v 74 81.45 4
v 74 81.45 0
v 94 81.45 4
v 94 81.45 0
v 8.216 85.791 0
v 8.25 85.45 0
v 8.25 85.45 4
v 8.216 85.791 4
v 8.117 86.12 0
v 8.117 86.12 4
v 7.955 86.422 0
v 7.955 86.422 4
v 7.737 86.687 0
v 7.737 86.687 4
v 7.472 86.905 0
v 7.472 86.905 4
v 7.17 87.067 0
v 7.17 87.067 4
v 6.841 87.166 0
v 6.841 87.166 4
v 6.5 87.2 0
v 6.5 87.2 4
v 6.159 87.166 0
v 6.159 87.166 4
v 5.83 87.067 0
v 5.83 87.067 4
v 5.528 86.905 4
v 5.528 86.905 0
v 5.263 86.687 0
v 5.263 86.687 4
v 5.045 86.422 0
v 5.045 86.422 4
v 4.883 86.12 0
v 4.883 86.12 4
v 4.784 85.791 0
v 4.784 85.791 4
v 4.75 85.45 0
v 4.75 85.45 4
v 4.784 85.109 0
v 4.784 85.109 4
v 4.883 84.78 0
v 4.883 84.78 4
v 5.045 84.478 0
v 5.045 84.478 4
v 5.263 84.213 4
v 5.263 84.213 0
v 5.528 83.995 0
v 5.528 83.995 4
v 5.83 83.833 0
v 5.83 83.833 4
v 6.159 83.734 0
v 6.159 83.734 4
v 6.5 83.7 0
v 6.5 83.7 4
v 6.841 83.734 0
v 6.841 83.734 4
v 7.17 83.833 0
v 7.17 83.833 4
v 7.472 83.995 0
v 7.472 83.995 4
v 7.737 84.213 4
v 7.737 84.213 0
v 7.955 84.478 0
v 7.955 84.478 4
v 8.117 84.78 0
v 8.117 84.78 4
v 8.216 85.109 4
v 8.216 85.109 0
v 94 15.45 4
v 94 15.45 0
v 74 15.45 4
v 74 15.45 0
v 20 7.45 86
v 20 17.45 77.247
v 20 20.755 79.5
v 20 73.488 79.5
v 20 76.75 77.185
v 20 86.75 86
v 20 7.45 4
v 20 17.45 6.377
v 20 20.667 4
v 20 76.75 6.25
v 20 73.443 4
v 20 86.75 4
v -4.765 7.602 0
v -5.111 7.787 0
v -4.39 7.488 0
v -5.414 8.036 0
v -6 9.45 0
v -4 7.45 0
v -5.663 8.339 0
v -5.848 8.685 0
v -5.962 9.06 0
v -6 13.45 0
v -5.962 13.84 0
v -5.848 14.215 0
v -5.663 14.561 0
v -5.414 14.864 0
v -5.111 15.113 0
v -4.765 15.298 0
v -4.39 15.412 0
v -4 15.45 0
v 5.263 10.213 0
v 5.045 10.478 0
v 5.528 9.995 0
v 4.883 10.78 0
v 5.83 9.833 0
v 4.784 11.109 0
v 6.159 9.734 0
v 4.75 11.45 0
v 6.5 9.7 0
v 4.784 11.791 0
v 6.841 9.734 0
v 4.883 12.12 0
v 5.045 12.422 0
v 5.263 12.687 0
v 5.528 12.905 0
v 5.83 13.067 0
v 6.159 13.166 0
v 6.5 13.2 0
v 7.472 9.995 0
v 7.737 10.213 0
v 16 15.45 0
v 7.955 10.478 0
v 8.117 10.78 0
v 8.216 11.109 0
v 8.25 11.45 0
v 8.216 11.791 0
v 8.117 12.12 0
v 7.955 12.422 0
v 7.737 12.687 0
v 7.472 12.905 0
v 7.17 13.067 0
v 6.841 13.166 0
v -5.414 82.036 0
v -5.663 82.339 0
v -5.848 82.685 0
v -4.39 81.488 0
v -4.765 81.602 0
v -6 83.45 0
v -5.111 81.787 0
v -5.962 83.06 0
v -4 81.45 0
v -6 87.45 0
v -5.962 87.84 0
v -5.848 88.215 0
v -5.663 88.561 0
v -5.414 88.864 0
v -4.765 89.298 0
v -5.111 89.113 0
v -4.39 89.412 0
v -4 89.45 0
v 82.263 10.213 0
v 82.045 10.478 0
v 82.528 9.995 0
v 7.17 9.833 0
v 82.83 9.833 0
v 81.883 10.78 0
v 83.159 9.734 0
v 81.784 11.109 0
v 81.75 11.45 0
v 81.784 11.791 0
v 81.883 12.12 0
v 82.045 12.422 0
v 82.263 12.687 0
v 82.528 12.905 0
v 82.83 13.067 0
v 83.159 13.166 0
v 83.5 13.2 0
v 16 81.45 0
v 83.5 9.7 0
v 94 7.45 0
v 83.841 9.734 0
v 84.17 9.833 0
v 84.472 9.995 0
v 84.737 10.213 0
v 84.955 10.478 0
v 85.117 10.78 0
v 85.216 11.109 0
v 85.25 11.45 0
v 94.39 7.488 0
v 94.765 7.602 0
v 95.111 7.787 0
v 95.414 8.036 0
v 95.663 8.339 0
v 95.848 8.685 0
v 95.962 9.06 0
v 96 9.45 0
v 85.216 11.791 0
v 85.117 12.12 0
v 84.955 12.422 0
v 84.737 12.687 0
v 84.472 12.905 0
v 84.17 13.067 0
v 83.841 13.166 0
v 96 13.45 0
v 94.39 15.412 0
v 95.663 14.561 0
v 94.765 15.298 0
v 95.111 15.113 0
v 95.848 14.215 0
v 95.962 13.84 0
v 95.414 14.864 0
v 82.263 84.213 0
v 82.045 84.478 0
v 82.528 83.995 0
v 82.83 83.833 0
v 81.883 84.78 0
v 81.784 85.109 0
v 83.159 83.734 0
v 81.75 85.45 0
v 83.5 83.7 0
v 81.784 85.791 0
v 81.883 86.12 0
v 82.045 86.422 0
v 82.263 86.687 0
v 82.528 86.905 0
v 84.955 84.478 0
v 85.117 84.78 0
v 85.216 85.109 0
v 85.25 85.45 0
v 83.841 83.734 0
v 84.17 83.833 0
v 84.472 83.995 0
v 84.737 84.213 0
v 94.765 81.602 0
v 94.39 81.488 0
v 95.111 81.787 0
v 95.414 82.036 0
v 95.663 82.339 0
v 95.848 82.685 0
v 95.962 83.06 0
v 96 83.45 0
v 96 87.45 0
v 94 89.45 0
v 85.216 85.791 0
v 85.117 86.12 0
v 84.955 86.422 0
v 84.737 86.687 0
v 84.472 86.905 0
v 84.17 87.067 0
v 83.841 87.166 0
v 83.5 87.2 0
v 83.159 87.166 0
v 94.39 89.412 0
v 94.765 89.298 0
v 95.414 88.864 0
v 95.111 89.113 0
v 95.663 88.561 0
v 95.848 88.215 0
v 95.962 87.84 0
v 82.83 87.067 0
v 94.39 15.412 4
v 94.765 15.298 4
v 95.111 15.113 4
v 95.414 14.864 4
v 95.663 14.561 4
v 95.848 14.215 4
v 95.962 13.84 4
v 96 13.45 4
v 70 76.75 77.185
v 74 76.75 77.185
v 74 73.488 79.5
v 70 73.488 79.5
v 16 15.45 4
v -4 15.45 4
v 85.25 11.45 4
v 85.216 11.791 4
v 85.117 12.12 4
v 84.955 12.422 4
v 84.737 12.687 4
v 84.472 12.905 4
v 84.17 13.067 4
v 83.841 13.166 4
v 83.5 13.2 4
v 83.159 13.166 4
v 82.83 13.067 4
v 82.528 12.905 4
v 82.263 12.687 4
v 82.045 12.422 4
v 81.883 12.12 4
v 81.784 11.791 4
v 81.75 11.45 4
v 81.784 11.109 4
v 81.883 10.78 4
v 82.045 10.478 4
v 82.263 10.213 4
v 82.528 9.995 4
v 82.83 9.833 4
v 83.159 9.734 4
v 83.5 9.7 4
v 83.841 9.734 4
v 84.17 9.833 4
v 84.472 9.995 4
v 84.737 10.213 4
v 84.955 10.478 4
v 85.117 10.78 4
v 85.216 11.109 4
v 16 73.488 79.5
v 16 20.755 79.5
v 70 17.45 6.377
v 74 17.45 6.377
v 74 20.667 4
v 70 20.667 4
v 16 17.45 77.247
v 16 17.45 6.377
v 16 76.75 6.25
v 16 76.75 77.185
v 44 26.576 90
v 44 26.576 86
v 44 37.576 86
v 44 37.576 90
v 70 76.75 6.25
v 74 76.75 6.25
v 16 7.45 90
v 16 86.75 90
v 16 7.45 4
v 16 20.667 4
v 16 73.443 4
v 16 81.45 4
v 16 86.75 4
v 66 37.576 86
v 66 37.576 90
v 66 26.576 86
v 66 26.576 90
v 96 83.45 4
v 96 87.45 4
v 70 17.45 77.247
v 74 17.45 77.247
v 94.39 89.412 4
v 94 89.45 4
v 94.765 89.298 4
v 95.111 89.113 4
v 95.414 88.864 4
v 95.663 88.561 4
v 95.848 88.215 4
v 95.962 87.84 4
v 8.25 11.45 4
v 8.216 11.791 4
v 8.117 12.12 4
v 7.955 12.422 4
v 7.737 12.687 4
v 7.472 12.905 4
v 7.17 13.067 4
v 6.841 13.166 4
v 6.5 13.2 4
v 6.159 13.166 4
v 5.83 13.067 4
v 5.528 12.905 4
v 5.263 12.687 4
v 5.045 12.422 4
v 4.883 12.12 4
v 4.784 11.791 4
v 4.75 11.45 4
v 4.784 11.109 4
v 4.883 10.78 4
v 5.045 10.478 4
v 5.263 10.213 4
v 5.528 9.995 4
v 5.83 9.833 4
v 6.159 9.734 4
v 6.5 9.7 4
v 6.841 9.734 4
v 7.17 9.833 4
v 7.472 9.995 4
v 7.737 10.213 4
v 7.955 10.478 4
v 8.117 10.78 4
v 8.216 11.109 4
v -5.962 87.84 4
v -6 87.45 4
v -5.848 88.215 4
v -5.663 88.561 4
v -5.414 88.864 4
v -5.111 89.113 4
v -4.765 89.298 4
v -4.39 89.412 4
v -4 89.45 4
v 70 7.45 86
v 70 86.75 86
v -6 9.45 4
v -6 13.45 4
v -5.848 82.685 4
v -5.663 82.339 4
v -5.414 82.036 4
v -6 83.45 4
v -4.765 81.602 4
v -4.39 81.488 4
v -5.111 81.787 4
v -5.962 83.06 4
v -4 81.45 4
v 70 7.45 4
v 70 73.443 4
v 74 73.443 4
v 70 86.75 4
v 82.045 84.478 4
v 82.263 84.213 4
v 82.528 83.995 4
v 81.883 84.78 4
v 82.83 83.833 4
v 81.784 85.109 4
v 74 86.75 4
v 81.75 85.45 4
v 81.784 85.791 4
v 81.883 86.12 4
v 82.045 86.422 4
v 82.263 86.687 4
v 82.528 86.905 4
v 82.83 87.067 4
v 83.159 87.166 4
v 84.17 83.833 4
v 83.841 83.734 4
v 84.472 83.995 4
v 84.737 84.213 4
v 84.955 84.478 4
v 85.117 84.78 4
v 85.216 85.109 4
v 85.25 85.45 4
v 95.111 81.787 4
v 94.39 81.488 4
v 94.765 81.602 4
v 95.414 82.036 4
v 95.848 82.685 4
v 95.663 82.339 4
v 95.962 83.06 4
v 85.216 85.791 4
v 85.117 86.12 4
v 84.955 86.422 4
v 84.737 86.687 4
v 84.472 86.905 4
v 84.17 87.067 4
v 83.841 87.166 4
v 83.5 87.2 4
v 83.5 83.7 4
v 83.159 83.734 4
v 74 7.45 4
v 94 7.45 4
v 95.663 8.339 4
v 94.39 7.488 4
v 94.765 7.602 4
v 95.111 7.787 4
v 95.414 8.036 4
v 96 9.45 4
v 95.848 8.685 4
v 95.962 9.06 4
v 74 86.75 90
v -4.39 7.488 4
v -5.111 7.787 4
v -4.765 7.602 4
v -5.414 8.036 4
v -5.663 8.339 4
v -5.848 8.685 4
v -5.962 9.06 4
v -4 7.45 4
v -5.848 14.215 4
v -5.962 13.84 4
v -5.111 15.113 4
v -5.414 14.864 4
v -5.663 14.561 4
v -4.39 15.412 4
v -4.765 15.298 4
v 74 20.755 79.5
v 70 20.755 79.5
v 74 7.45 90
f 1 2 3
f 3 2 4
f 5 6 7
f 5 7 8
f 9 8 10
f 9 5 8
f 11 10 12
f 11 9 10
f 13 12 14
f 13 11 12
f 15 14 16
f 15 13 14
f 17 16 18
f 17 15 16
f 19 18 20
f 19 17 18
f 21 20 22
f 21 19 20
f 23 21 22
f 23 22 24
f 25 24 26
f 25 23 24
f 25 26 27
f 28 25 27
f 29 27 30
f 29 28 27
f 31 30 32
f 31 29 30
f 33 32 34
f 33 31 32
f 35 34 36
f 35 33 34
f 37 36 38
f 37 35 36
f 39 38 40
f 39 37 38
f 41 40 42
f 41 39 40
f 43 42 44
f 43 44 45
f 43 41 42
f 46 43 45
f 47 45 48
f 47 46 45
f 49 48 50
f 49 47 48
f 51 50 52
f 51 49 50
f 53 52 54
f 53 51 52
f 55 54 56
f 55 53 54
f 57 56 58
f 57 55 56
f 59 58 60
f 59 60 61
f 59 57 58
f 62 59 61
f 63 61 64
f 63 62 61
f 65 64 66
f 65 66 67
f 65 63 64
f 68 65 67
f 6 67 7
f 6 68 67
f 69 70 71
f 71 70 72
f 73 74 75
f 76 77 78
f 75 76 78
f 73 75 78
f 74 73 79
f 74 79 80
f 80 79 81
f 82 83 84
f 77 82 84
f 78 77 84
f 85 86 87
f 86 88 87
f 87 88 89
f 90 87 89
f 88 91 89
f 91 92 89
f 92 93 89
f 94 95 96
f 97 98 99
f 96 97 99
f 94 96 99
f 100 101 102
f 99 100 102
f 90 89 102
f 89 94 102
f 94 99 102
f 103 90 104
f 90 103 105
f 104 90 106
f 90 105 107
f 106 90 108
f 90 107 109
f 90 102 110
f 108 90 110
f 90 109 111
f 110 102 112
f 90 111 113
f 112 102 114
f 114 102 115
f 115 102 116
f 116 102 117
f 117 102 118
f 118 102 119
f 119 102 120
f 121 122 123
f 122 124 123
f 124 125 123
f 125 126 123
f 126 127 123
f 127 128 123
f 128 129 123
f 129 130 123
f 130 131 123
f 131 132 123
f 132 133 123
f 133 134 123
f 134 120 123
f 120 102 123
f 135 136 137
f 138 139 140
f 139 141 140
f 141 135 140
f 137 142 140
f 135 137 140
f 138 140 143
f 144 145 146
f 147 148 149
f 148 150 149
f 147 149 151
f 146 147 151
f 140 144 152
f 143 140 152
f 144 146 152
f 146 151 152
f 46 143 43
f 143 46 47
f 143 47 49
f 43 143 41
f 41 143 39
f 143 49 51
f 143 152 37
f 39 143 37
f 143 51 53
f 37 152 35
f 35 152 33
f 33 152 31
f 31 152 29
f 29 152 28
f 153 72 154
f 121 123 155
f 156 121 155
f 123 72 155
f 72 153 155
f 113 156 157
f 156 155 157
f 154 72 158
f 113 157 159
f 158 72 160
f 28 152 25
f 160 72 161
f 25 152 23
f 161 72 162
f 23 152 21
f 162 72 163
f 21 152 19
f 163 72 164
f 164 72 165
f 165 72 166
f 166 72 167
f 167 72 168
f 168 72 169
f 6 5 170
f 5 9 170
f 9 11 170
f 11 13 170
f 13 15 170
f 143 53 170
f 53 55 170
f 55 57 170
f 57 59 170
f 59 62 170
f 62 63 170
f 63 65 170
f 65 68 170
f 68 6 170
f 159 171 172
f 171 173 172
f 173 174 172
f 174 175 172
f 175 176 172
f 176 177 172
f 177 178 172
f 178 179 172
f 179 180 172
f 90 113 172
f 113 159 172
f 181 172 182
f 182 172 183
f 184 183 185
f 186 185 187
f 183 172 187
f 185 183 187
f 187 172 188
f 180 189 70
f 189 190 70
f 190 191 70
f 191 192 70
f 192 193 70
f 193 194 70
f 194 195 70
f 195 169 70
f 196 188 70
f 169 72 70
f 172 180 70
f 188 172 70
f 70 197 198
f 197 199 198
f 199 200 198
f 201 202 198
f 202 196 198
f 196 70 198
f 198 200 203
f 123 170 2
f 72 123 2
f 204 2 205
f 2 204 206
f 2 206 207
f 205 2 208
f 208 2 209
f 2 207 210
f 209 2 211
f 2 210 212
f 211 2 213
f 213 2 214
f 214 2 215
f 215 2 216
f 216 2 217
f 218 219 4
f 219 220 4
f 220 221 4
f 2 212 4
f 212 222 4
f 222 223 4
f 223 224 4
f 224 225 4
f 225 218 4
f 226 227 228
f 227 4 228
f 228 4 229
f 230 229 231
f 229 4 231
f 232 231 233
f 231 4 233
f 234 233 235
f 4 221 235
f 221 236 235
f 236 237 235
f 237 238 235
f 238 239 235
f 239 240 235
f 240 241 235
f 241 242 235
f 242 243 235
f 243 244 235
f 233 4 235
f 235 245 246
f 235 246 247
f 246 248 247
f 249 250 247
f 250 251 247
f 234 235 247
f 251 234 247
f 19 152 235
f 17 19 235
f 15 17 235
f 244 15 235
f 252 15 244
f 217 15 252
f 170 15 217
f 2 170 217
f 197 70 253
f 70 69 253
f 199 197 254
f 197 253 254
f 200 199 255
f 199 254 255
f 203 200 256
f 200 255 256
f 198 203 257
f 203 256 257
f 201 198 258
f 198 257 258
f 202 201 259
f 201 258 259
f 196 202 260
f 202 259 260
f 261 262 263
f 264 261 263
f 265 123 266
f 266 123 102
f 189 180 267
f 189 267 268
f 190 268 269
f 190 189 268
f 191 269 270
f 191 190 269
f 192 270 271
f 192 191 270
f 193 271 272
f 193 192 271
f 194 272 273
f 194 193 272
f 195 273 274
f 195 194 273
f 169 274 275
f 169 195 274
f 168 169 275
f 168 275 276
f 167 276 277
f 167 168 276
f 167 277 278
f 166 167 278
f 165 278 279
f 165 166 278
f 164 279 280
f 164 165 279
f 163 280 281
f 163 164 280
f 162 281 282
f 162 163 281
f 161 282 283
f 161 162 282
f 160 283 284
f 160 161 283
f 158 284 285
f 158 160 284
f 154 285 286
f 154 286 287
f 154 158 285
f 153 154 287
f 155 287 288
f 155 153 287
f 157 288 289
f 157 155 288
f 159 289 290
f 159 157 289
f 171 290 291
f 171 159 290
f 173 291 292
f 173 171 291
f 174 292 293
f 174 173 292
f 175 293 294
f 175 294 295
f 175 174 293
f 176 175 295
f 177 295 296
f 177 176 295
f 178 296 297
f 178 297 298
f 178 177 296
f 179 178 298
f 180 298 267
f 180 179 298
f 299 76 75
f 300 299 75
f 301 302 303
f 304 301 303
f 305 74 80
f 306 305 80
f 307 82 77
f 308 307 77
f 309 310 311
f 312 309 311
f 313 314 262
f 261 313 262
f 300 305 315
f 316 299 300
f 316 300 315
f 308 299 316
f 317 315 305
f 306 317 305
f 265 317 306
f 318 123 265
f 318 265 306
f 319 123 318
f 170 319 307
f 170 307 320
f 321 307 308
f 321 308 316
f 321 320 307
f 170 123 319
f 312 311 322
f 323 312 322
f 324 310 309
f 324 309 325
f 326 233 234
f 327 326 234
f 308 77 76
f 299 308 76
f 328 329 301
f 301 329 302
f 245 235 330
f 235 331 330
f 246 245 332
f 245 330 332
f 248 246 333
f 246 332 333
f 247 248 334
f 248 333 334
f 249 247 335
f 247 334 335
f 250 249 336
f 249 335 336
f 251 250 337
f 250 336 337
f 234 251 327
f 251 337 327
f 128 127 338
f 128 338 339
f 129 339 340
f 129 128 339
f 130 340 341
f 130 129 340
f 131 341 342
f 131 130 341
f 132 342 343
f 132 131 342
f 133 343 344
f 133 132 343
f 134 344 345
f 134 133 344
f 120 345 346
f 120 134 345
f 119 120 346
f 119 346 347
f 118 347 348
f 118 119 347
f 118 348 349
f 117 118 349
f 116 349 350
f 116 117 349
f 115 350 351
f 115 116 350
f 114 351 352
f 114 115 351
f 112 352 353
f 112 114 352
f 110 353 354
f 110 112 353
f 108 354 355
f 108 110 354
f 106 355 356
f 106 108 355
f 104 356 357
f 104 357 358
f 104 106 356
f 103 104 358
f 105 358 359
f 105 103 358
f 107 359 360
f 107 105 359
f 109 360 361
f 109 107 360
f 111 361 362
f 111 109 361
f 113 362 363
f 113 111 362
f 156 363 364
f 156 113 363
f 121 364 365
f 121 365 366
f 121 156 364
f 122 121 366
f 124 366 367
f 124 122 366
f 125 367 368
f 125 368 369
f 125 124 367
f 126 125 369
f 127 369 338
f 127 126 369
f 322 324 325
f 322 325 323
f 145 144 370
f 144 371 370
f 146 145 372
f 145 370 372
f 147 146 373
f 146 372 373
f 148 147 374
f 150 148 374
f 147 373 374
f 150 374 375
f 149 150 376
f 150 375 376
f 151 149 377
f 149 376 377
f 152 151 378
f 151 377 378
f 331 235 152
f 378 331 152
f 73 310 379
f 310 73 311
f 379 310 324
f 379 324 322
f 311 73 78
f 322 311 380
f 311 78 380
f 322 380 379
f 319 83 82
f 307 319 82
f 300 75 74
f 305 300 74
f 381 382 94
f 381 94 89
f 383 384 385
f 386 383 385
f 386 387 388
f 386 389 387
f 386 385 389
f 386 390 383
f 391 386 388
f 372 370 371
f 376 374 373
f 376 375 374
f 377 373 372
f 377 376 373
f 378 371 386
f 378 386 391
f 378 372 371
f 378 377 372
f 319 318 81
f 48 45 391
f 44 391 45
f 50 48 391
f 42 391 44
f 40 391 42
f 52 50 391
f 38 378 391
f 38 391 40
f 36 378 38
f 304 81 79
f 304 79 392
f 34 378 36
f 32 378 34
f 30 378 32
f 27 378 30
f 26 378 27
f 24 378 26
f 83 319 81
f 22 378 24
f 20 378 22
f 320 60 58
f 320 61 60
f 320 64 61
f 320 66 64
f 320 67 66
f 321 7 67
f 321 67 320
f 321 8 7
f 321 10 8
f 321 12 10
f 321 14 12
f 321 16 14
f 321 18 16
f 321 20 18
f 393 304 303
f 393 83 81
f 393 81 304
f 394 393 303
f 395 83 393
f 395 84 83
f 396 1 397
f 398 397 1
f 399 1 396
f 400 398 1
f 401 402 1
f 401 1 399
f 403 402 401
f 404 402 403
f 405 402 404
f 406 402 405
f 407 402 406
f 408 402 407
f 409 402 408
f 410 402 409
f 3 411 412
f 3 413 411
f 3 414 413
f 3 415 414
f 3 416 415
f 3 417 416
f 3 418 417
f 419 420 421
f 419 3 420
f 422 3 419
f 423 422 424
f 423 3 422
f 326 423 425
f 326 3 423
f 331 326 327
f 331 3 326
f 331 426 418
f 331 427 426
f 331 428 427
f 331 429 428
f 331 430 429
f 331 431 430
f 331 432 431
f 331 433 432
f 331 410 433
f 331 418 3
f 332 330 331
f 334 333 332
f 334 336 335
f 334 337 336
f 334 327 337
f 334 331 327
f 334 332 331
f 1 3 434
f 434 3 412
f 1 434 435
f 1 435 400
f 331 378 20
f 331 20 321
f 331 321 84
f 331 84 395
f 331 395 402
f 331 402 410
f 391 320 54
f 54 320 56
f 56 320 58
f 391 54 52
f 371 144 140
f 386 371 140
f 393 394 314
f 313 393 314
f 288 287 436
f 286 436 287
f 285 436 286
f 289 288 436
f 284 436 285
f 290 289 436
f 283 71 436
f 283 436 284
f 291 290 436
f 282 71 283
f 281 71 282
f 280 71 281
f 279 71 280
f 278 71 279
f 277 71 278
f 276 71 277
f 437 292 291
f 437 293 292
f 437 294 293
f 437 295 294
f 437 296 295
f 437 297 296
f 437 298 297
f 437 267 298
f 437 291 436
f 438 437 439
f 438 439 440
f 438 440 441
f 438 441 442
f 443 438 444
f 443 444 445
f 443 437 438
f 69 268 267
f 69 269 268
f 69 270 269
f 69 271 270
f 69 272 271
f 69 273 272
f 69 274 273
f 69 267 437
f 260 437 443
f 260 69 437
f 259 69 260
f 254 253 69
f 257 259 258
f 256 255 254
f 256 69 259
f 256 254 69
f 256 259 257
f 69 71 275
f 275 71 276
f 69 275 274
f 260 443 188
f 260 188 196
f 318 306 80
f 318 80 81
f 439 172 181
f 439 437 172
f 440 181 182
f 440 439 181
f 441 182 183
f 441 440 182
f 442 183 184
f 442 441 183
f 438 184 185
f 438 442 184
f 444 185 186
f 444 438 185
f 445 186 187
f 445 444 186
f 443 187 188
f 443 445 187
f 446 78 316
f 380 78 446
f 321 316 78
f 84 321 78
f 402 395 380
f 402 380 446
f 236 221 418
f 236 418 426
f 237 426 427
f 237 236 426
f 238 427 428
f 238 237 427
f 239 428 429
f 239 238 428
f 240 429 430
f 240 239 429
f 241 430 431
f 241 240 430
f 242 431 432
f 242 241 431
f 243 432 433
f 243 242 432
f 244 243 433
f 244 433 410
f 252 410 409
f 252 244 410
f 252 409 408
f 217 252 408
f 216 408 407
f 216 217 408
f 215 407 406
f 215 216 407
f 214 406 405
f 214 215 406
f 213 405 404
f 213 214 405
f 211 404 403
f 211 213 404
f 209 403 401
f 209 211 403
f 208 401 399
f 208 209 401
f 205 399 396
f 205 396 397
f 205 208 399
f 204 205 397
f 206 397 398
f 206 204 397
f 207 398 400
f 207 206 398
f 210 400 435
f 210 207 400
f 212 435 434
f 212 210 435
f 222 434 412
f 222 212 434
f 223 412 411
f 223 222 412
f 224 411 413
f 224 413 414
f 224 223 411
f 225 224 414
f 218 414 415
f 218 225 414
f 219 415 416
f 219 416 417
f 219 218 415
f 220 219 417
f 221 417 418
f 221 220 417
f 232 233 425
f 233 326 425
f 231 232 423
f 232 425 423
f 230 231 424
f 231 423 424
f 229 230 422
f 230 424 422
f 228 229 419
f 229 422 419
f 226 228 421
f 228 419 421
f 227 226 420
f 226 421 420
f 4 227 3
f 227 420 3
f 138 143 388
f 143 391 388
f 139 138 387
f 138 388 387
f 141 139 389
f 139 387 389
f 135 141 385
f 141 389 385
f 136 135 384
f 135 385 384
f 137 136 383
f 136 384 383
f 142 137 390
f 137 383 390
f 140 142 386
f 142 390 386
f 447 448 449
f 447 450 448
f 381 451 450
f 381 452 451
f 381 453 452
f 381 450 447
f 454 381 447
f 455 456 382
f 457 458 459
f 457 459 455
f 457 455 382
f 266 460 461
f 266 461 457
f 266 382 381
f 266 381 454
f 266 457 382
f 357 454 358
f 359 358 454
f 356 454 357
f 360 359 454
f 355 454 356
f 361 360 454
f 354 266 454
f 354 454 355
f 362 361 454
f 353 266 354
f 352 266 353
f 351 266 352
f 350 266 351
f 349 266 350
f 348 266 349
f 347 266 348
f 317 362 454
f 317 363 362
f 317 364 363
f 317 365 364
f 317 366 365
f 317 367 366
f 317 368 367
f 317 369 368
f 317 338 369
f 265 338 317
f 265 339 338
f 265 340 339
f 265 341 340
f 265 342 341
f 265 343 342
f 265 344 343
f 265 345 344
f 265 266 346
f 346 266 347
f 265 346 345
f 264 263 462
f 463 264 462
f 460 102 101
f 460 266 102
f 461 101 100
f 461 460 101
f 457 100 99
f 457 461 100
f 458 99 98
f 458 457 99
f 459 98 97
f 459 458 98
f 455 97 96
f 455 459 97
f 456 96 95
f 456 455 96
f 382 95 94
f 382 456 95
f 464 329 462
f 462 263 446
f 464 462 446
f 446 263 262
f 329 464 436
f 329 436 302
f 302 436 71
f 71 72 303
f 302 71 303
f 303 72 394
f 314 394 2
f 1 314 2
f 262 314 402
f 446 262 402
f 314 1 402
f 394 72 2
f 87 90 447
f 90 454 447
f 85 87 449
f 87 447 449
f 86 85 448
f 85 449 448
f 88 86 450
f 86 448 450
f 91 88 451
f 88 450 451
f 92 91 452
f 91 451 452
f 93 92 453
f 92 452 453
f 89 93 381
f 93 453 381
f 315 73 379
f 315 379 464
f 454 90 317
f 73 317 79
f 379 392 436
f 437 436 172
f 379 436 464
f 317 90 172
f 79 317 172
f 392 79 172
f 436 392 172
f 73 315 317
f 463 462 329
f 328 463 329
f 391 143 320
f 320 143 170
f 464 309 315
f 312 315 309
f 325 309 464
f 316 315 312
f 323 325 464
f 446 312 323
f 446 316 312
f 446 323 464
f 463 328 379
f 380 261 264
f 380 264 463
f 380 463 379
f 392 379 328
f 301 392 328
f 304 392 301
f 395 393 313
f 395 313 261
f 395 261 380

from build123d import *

# Parameters (mm, degrees)
F0_R      = 1.75
F1_DEPTH  = 4
F3_W      = 3
F3_H      = 79.3
F4_DEPTH  = 82
F5_DEPTH  = 2
F6_DEPTH  = 2
F7_DEPTH  = 3
F8_DEPTH  = 3
F9_R      = 2
F12_DEPTH = 80.001
F14_W     = 58
F14_H     = 79.3
F14_W_2   = 22
F14_H_2   = 11
F15_DEPTH = 4


with BuildPart() as f1:
    # F0 (on Top) → F1 (new body)
    with BuildSketch(Plane.XY):
        Polygon((71, 89.45), (19, 89.45), (-6, 89.45), (-6, 81.45), (19, 81.45), (19, 15.45), (-6, 15.45), (-6, 7.45), (19, 7.45), (71, 7.45), (96, 7.45), (96, 15.45), (71, 15.45), (71, 81.45), (96, 81.45), (96, 89.45), align=None)
        with Locations((6.5, 11.45)):
            Circle(F0_R, mode=Mode.SUBTRACT)
        with Locations((83.5, 11.45)):
            Circle(F0_R, mode=Mode.SUBTRACT)
        with Locations((6.5, 85.45)):
            Circle(F0_R, mode=Mode.SUBTRACT)
        with Locations((83.5, 85.45)):
            Circle(F0_R, mode=Mode.SUBTRACT)
    extrude(amount=F1_DEPTH)

    # F3 (on offset) → F4 (join)
    with BuildSketch(Plane.XY.offset(4)):
        with Locations((20.5, 47.1)):
            Rectangle(F3_W, F3_H)
        with Locations((69.5, 47.1)):
            Rectangle(F3_W, F3_H)
    extrude(amount=F4_DEPTH)

    # F5 (cut): a face of the model
    f5_faces = [f1.faces().sort_by_distance(p)[0] for p in [
        (22, 47.1, 45),
    ]]
    extrude(f5_faces, amount=-F5_DEPTH, mode=Mode.SUBTRACT)

    # F6 (cut): a face of the model
    f6_faces = [f1.faces().sort_by_distance(p)[0] for p in [
        (68, 47.1, 45),
    ]]
    extrude(f6_faces, amount=-F6_DEPTH, mode=Mode.SUBTRACT)

    # F7 (add): a face of the model
    f7_faces = [f1.faces().sort_by_distance(p)[0] for p in [
        (71, 47.1526704697, 43.3223480034),
    ]]
    extrude(f7_faces, amount=F7_DEPTH)

    # F8 (add): a face of the model
    f8_faces = [f1.faces().sort_by_distance(p)[0] for p in [
        (19, 47.1526704697, 43.3223480034),
    ]]
    extrude(f8_faces, amount=F8_DEPTH)

    # F9
    f9_edges = [f1.edges().sort_by_distance(p)[0] for p in [
        (96, 81.45, 2),
        (96, 89.45, 2),
        (96, 15.45, 2),
        (96, 7.45, 2),
        (-6, 7.45, 2),
        (-6, 89.45, 2),
        (-6, 81.45, 2),
        (-6, 15.45, 2),
    ]]
    fillet(f9_edges, radius=F9_R)

    # F11 (on offset) → F12 (cut, through all)
    with BuildSketch(Plane.YZ.offset(74)):
        Polygon((73.4880973649, 79.5), (20.7553358046, 79.5), (17.45, 77.2472782643), (17.45, 6.3772784262), (20.6669158031, 4), (73.4427470628, 4), (76.75, 6.2499062224), (76.75, 77.1848345202), align=None)
    extrude(amount=-F12_DEPTH, mode=Mode.SUBTRACT)

    # F14 (on offset) → F15 (join)
    with BuildSketch(Plane.XY.offset(86)):
        with Locations((45, 47.1)):
            Rectangle(F14_W, F14_H)
        with Locations((55, 32.0759117305)):
            Rectangle(F14_W_2, F14_H_2, mode=Mode.SUBTRACT)
    extrude(amount=F15_DEPTH)


solid = f1.part
